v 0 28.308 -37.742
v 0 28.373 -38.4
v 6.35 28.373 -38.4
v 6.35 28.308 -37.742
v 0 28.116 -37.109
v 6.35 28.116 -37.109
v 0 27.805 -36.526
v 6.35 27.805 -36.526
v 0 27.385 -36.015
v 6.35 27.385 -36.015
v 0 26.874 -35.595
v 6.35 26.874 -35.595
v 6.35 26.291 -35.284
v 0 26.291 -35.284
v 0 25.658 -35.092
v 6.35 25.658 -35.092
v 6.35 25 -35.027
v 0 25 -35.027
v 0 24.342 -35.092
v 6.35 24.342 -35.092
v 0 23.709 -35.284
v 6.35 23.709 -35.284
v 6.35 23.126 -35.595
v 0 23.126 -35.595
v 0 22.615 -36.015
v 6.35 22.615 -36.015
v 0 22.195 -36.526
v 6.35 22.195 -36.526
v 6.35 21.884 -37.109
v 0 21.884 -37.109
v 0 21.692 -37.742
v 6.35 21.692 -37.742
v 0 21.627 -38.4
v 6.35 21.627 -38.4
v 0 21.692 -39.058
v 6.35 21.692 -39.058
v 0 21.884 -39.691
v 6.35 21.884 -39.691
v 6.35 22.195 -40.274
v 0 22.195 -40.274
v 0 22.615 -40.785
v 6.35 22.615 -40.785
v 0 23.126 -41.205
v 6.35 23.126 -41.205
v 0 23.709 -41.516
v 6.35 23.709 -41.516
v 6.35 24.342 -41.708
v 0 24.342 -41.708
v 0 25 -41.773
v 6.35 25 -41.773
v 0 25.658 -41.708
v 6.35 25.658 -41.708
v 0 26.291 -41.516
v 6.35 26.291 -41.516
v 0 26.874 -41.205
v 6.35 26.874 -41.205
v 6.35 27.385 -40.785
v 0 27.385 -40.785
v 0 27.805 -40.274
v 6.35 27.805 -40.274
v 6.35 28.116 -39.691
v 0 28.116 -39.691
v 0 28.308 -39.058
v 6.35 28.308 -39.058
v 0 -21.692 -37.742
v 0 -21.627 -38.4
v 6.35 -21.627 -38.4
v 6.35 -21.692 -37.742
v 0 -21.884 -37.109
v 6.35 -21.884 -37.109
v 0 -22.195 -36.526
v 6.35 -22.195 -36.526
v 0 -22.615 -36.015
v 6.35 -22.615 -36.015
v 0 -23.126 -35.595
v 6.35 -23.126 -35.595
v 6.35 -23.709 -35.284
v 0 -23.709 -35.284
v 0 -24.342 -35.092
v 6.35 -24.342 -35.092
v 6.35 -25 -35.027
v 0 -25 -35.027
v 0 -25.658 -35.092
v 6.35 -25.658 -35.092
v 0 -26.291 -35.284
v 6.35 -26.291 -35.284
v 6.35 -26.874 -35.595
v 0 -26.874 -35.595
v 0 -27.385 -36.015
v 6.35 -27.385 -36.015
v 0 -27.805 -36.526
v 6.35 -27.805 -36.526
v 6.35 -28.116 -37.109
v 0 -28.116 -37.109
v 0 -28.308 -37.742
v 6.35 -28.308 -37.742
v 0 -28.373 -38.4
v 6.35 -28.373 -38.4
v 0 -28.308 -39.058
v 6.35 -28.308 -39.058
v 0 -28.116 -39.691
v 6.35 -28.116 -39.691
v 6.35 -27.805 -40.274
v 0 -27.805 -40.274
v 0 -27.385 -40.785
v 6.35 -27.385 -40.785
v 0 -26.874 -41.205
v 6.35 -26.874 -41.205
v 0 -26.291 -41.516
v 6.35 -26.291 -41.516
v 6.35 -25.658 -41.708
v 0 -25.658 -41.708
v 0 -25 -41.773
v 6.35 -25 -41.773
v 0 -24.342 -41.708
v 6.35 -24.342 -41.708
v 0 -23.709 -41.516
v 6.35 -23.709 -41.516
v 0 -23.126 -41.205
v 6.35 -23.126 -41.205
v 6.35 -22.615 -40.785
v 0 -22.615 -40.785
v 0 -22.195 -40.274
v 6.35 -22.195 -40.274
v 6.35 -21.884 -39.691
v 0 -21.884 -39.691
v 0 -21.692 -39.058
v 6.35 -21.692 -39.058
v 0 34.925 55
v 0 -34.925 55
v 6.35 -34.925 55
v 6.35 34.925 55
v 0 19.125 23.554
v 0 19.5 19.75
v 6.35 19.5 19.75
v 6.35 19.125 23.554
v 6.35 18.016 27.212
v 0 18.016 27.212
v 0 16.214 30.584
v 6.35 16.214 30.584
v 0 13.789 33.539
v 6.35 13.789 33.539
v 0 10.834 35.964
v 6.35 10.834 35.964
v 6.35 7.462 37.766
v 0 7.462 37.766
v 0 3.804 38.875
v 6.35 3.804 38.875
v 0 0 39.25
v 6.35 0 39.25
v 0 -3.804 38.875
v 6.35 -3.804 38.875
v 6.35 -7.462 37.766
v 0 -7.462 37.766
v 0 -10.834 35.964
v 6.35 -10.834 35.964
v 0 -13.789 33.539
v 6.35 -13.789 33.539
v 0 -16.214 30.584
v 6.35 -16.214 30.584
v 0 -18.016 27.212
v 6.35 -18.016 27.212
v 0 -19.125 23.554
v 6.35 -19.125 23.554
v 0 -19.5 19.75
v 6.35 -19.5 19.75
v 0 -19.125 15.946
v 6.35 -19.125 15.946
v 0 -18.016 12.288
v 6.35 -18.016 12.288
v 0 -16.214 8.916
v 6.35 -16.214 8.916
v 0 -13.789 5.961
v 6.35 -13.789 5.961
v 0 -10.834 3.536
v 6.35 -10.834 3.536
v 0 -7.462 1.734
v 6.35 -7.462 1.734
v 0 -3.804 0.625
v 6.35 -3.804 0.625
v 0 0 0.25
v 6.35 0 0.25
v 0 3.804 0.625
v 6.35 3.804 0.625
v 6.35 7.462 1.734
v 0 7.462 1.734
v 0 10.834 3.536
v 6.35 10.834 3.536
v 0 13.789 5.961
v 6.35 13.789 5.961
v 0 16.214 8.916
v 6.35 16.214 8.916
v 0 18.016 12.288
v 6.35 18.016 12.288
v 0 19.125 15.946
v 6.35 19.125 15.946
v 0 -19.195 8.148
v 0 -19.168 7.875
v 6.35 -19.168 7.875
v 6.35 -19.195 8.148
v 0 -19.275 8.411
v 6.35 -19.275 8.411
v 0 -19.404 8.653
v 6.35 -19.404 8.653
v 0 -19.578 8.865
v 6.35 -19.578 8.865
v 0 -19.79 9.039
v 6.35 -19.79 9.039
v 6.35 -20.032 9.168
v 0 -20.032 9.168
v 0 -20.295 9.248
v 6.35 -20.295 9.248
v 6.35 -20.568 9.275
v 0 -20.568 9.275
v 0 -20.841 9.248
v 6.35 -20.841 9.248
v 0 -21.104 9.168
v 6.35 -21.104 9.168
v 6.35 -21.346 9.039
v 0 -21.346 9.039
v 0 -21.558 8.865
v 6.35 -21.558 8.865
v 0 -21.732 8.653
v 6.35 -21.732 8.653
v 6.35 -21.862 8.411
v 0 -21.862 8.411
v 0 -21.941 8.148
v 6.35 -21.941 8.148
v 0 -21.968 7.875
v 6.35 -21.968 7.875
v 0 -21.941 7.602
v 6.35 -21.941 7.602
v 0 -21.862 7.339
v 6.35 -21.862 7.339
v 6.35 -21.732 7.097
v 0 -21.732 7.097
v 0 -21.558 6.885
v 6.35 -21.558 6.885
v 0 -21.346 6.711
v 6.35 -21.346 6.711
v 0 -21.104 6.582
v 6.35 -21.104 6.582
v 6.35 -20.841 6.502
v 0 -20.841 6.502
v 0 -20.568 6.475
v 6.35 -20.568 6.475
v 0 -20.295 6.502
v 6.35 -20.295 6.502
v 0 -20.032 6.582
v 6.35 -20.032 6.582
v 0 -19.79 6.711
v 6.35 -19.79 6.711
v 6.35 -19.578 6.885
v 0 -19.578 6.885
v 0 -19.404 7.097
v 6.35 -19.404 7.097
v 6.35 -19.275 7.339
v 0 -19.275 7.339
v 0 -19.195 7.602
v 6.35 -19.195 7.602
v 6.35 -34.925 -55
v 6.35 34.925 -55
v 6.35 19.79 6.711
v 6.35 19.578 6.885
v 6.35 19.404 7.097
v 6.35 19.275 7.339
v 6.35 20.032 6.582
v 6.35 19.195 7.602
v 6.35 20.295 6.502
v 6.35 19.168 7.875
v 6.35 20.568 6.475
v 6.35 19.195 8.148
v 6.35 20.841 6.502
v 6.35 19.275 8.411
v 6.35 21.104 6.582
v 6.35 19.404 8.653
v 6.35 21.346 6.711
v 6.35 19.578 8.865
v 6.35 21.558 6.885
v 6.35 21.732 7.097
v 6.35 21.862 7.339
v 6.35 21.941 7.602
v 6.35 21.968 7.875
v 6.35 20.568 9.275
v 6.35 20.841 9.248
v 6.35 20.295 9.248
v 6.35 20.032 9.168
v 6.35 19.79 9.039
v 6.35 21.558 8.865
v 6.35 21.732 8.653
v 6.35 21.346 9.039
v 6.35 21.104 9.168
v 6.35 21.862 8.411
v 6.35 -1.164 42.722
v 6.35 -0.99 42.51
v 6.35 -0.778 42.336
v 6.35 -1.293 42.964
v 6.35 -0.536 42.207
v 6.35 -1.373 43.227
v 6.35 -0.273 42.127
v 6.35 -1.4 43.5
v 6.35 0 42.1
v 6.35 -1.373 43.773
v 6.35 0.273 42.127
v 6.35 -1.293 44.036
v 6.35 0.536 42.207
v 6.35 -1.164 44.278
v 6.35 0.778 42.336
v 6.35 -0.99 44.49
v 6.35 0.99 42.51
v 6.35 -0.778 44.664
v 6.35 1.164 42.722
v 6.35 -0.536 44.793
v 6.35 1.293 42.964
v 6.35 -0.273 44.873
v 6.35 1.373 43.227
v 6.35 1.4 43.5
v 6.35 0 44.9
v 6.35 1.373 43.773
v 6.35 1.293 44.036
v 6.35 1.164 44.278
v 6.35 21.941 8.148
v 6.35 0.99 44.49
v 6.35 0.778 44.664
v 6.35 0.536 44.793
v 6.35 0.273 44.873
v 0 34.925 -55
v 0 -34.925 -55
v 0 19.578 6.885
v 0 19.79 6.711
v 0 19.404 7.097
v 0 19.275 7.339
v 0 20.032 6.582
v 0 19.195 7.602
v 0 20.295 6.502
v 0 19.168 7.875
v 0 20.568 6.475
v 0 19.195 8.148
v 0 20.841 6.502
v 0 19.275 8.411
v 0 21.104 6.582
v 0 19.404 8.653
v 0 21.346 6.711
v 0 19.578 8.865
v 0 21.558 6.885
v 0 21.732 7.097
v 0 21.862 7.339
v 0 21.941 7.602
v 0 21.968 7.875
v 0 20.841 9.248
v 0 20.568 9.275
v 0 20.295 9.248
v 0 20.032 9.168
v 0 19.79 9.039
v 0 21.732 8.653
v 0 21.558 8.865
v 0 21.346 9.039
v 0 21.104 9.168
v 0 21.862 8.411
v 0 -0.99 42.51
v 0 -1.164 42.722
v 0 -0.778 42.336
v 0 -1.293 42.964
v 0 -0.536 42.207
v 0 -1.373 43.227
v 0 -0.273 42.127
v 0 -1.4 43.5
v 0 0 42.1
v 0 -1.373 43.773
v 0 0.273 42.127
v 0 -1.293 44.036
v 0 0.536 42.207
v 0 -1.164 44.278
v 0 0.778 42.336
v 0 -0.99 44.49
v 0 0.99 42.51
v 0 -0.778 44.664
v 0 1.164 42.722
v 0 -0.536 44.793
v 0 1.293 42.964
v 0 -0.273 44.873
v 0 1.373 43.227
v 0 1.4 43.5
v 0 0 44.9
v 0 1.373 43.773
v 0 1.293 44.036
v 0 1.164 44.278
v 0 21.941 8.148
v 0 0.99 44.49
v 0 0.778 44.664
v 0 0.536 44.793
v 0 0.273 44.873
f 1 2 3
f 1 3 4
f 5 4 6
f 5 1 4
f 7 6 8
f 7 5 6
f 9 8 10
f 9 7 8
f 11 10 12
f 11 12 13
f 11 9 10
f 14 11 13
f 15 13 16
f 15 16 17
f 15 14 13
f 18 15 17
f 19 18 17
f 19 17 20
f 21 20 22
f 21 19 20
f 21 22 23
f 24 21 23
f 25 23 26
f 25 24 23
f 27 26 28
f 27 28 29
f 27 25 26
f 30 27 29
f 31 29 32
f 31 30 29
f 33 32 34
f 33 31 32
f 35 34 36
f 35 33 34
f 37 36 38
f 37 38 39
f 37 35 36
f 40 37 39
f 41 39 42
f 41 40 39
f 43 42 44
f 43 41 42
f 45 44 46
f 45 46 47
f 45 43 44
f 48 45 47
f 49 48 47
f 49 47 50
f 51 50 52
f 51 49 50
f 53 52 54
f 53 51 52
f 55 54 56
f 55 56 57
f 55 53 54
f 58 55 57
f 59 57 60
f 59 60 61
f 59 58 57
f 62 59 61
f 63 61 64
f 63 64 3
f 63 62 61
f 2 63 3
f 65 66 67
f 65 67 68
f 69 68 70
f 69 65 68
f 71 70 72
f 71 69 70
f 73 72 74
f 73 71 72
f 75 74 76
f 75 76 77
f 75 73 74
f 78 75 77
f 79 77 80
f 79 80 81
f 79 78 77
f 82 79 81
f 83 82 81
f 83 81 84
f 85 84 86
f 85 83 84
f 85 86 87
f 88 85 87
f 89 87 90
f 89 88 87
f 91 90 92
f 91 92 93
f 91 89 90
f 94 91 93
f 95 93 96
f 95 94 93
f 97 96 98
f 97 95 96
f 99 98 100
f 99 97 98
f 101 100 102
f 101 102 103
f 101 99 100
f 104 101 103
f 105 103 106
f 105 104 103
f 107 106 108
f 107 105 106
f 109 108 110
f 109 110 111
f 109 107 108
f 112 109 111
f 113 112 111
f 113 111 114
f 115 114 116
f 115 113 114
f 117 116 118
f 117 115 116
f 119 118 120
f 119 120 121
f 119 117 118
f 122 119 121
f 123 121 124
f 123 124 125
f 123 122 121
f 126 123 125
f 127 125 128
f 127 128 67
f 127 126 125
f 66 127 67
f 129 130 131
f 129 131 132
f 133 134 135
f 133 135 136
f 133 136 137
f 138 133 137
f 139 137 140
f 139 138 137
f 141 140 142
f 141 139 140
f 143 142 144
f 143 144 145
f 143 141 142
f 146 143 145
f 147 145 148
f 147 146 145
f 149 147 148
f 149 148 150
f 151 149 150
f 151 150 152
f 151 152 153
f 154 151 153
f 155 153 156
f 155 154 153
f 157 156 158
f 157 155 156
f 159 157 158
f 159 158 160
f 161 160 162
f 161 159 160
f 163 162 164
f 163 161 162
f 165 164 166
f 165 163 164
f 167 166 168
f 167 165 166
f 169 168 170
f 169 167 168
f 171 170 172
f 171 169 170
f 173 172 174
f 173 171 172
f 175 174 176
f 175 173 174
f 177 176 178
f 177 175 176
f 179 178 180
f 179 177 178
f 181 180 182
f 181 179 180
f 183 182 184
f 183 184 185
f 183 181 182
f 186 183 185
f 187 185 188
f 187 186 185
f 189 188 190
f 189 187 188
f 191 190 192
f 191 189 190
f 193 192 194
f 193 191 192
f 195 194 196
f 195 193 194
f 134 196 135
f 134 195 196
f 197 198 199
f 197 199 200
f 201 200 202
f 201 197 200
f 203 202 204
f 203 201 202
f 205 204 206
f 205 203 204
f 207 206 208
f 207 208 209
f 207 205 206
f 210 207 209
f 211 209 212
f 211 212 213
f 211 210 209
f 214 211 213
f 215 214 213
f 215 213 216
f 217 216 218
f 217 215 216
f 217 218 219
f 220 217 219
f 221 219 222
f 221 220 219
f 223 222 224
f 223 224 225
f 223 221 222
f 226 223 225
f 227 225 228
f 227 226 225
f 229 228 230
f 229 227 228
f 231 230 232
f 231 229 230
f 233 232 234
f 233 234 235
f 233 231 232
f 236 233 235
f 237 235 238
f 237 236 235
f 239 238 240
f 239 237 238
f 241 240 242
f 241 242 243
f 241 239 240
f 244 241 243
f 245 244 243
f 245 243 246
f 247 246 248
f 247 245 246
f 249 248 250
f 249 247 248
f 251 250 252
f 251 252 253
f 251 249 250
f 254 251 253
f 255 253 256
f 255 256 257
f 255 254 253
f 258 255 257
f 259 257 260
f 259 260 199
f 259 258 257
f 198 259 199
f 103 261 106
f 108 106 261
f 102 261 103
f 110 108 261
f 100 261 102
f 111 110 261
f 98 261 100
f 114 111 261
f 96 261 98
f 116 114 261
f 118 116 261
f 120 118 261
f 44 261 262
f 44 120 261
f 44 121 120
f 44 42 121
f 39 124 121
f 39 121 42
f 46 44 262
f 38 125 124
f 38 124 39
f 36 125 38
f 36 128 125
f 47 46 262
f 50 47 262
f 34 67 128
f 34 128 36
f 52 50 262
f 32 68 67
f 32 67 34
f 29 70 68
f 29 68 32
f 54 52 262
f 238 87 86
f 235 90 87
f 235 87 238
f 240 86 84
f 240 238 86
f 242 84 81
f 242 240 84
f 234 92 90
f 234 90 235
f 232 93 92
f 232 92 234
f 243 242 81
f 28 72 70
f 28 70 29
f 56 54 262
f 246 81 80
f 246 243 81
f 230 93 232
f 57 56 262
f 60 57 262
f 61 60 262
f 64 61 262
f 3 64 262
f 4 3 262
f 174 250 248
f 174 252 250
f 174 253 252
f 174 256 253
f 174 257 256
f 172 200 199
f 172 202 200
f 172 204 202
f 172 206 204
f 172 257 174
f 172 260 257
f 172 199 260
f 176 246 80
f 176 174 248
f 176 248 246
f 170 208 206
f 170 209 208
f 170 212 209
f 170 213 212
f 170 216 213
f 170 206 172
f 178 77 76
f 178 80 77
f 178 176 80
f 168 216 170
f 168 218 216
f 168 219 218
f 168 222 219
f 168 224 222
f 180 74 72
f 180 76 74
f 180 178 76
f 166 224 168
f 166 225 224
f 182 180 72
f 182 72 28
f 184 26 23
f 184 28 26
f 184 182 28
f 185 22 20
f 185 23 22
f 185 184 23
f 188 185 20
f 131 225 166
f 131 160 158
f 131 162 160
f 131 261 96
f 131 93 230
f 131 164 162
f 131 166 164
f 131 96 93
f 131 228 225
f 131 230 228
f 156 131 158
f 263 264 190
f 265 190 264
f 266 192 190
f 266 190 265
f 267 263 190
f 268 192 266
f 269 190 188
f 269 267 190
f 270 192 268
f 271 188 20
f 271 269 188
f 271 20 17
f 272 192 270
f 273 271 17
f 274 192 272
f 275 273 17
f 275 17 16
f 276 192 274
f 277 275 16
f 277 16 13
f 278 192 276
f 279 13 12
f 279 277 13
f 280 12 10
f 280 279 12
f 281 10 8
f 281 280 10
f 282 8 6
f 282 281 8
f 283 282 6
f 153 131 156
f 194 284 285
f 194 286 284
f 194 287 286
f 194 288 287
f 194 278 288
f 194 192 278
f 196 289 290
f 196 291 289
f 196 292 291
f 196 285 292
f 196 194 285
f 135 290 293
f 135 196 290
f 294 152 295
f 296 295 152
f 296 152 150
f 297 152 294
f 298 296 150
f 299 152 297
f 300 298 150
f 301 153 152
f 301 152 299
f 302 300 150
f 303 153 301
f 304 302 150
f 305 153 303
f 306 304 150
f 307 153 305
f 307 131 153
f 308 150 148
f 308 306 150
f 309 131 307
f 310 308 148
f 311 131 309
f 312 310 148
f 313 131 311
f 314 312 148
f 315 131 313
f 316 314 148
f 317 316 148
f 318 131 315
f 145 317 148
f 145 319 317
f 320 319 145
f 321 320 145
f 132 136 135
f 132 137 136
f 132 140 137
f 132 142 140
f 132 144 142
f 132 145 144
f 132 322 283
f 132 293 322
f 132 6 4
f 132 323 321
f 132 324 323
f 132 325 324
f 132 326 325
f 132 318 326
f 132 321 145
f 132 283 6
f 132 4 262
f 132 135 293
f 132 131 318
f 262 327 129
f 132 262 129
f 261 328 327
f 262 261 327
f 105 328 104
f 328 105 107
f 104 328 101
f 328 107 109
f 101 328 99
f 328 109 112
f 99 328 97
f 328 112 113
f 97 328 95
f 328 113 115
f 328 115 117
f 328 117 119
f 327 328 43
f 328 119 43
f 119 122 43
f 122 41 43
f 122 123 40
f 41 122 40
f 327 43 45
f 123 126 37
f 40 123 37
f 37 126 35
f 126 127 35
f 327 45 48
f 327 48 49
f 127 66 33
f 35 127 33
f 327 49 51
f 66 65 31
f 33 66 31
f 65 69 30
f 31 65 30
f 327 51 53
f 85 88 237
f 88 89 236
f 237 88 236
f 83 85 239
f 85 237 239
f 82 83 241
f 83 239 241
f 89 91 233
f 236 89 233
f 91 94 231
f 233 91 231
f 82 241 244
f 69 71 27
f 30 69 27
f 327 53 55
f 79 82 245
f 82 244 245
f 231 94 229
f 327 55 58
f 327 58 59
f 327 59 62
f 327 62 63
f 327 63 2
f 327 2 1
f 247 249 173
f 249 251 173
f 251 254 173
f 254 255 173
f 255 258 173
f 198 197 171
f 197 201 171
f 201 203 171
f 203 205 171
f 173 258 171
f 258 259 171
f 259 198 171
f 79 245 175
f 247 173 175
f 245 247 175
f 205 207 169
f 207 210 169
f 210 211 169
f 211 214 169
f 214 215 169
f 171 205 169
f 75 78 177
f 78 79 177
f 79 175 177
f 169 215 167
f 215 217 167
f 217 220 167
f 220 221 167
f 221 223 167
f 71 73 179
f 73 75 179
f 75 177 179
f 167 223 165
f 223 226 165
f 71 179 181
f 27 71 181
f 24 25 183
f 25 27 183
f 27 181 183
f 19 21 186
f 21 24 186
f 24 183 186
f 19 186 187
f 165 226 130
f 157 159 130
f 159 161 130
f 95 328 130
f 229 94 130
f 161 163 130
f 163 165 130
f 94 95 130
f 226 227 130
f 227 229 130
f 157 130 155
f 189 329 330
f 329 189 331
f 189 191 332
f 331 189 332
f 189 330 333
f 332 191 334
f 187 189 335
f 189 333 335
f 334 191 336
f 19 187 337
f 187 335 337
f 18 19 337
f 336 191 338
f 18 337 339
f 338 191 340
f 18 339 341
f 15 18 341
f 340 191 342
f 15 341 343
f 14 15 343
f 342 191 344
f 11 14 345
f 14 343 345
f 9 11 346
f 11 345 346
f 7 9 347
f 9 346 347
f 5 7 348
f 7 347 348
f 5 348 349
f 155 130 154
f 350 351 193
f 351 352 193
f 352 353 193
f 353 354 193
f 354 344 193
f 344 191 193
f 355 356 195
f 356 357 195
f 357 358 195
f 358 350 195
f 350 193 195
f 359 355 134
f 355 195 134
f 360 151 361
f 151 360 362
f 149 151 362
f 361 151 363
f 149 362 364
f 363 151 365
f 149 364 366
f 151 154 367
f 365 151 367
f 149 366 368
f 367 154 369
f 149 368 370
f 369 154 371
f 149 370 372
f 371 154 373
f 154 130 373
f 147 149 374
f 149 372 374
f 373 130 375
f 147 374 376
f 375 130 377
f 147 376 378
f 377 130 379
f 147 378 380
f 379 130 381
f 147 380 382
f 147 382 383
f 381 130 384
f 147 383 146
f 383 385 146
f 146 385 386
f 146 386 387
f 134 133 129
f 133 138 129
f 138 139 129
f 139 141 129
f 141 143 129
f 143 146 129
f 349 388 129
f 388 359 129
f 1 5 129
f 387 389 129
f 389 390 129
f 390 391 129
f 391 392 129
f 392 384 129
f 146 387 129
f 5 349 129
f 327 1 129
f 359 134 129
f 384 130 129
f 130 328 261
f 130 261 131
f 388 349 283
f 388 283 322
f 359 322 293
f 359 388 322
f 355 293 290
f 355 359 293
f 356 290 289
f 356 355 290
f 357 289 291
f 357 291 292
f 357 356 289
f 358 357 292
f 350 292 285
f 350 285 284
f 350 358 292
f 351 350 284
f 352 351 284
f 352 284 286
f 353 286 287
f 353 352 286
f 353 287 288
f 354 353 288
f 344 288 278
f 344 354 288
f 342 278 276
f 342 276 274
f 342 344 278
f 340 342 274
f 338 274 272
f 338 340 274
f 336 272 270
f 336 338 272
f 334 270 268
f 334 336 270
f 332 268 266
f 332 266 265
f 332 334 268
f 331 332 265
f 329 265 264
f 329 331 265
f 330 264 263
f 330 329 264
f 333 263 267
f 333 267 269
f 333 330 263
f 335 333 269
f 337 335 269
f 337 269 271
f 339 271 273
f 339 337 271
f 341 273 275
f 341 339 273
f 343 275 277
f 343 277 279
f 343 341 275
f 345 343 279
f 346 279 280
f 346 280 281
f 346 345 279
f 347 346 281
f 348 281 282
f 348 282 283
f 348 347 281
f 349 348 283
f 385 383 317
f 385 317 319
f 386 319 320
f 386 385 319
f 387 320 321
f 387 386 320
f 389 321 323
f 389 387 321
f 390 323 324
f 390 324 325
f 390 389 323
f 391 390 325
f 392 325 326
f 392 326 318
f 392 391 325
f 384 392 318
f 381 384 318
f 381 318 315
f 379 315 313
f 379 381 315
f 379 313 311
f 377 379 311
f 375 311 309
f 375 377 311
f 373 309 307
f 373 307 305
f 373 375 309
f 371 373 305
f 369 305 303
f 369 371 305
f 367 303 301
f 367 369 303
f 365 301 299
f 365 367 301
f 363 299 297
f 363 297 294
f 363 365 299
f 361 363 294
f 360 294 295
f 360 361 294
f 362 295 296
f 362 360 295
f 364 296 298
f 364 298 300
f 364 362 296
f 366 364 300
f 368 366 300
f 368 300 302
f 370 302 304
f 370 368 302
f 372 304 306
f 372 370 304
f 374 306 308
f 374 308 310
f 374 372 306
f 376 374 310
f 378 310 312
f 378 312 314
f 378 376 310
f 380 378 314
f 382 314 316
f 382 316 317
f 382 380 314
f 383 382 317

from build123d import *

# Parameters (mm, degrees)
SKETCH1_W           = 69.85
SKETCH1_H           = 110
SKETCH1_R           = 19.5
SKETCH1_R_2         = 3.37312
SKETCH1_R_3         = 1.4
BOSS_EXTRUDE1_DEPTH = 6.35


with BuildPart() as part:
    # Sketch1 → Boss-Extrude1 (new body)
    with BuildSketch(Plane.YZ):
        Rectangle(SKETCH1_W, SKETCH1_H)
        with Locations((0, 19.75)):
            Circle(SKETCH1_R, mode=Mode.SUBTRACT)
        with Locations((-25, -38.4)):
            Circle(SKETCH1_R_2, mode=Mode.SUBTRACT)
        with Locations((25, -38.4)):
            Circle(SKETCH1_R_2, mode=Mode.SUBTRACT)
        with Locations((0, 43.5)):
            Circle(SKETCH1_R_3, mode=Mode.SUBTRACT)
        with Locations((20.56810334, 7.875)):
            Circle(SKETCH1_R_3, mode=Mode.SUBTRACT)
        with Locations((-20.56810334, 7.875)):
            Circle(SKETCH1_R_3, mode=Mode.SUBTRACT)
    extrude(amount=BOSS_EXTRUDE1_DEPTH)


solid = part.part
